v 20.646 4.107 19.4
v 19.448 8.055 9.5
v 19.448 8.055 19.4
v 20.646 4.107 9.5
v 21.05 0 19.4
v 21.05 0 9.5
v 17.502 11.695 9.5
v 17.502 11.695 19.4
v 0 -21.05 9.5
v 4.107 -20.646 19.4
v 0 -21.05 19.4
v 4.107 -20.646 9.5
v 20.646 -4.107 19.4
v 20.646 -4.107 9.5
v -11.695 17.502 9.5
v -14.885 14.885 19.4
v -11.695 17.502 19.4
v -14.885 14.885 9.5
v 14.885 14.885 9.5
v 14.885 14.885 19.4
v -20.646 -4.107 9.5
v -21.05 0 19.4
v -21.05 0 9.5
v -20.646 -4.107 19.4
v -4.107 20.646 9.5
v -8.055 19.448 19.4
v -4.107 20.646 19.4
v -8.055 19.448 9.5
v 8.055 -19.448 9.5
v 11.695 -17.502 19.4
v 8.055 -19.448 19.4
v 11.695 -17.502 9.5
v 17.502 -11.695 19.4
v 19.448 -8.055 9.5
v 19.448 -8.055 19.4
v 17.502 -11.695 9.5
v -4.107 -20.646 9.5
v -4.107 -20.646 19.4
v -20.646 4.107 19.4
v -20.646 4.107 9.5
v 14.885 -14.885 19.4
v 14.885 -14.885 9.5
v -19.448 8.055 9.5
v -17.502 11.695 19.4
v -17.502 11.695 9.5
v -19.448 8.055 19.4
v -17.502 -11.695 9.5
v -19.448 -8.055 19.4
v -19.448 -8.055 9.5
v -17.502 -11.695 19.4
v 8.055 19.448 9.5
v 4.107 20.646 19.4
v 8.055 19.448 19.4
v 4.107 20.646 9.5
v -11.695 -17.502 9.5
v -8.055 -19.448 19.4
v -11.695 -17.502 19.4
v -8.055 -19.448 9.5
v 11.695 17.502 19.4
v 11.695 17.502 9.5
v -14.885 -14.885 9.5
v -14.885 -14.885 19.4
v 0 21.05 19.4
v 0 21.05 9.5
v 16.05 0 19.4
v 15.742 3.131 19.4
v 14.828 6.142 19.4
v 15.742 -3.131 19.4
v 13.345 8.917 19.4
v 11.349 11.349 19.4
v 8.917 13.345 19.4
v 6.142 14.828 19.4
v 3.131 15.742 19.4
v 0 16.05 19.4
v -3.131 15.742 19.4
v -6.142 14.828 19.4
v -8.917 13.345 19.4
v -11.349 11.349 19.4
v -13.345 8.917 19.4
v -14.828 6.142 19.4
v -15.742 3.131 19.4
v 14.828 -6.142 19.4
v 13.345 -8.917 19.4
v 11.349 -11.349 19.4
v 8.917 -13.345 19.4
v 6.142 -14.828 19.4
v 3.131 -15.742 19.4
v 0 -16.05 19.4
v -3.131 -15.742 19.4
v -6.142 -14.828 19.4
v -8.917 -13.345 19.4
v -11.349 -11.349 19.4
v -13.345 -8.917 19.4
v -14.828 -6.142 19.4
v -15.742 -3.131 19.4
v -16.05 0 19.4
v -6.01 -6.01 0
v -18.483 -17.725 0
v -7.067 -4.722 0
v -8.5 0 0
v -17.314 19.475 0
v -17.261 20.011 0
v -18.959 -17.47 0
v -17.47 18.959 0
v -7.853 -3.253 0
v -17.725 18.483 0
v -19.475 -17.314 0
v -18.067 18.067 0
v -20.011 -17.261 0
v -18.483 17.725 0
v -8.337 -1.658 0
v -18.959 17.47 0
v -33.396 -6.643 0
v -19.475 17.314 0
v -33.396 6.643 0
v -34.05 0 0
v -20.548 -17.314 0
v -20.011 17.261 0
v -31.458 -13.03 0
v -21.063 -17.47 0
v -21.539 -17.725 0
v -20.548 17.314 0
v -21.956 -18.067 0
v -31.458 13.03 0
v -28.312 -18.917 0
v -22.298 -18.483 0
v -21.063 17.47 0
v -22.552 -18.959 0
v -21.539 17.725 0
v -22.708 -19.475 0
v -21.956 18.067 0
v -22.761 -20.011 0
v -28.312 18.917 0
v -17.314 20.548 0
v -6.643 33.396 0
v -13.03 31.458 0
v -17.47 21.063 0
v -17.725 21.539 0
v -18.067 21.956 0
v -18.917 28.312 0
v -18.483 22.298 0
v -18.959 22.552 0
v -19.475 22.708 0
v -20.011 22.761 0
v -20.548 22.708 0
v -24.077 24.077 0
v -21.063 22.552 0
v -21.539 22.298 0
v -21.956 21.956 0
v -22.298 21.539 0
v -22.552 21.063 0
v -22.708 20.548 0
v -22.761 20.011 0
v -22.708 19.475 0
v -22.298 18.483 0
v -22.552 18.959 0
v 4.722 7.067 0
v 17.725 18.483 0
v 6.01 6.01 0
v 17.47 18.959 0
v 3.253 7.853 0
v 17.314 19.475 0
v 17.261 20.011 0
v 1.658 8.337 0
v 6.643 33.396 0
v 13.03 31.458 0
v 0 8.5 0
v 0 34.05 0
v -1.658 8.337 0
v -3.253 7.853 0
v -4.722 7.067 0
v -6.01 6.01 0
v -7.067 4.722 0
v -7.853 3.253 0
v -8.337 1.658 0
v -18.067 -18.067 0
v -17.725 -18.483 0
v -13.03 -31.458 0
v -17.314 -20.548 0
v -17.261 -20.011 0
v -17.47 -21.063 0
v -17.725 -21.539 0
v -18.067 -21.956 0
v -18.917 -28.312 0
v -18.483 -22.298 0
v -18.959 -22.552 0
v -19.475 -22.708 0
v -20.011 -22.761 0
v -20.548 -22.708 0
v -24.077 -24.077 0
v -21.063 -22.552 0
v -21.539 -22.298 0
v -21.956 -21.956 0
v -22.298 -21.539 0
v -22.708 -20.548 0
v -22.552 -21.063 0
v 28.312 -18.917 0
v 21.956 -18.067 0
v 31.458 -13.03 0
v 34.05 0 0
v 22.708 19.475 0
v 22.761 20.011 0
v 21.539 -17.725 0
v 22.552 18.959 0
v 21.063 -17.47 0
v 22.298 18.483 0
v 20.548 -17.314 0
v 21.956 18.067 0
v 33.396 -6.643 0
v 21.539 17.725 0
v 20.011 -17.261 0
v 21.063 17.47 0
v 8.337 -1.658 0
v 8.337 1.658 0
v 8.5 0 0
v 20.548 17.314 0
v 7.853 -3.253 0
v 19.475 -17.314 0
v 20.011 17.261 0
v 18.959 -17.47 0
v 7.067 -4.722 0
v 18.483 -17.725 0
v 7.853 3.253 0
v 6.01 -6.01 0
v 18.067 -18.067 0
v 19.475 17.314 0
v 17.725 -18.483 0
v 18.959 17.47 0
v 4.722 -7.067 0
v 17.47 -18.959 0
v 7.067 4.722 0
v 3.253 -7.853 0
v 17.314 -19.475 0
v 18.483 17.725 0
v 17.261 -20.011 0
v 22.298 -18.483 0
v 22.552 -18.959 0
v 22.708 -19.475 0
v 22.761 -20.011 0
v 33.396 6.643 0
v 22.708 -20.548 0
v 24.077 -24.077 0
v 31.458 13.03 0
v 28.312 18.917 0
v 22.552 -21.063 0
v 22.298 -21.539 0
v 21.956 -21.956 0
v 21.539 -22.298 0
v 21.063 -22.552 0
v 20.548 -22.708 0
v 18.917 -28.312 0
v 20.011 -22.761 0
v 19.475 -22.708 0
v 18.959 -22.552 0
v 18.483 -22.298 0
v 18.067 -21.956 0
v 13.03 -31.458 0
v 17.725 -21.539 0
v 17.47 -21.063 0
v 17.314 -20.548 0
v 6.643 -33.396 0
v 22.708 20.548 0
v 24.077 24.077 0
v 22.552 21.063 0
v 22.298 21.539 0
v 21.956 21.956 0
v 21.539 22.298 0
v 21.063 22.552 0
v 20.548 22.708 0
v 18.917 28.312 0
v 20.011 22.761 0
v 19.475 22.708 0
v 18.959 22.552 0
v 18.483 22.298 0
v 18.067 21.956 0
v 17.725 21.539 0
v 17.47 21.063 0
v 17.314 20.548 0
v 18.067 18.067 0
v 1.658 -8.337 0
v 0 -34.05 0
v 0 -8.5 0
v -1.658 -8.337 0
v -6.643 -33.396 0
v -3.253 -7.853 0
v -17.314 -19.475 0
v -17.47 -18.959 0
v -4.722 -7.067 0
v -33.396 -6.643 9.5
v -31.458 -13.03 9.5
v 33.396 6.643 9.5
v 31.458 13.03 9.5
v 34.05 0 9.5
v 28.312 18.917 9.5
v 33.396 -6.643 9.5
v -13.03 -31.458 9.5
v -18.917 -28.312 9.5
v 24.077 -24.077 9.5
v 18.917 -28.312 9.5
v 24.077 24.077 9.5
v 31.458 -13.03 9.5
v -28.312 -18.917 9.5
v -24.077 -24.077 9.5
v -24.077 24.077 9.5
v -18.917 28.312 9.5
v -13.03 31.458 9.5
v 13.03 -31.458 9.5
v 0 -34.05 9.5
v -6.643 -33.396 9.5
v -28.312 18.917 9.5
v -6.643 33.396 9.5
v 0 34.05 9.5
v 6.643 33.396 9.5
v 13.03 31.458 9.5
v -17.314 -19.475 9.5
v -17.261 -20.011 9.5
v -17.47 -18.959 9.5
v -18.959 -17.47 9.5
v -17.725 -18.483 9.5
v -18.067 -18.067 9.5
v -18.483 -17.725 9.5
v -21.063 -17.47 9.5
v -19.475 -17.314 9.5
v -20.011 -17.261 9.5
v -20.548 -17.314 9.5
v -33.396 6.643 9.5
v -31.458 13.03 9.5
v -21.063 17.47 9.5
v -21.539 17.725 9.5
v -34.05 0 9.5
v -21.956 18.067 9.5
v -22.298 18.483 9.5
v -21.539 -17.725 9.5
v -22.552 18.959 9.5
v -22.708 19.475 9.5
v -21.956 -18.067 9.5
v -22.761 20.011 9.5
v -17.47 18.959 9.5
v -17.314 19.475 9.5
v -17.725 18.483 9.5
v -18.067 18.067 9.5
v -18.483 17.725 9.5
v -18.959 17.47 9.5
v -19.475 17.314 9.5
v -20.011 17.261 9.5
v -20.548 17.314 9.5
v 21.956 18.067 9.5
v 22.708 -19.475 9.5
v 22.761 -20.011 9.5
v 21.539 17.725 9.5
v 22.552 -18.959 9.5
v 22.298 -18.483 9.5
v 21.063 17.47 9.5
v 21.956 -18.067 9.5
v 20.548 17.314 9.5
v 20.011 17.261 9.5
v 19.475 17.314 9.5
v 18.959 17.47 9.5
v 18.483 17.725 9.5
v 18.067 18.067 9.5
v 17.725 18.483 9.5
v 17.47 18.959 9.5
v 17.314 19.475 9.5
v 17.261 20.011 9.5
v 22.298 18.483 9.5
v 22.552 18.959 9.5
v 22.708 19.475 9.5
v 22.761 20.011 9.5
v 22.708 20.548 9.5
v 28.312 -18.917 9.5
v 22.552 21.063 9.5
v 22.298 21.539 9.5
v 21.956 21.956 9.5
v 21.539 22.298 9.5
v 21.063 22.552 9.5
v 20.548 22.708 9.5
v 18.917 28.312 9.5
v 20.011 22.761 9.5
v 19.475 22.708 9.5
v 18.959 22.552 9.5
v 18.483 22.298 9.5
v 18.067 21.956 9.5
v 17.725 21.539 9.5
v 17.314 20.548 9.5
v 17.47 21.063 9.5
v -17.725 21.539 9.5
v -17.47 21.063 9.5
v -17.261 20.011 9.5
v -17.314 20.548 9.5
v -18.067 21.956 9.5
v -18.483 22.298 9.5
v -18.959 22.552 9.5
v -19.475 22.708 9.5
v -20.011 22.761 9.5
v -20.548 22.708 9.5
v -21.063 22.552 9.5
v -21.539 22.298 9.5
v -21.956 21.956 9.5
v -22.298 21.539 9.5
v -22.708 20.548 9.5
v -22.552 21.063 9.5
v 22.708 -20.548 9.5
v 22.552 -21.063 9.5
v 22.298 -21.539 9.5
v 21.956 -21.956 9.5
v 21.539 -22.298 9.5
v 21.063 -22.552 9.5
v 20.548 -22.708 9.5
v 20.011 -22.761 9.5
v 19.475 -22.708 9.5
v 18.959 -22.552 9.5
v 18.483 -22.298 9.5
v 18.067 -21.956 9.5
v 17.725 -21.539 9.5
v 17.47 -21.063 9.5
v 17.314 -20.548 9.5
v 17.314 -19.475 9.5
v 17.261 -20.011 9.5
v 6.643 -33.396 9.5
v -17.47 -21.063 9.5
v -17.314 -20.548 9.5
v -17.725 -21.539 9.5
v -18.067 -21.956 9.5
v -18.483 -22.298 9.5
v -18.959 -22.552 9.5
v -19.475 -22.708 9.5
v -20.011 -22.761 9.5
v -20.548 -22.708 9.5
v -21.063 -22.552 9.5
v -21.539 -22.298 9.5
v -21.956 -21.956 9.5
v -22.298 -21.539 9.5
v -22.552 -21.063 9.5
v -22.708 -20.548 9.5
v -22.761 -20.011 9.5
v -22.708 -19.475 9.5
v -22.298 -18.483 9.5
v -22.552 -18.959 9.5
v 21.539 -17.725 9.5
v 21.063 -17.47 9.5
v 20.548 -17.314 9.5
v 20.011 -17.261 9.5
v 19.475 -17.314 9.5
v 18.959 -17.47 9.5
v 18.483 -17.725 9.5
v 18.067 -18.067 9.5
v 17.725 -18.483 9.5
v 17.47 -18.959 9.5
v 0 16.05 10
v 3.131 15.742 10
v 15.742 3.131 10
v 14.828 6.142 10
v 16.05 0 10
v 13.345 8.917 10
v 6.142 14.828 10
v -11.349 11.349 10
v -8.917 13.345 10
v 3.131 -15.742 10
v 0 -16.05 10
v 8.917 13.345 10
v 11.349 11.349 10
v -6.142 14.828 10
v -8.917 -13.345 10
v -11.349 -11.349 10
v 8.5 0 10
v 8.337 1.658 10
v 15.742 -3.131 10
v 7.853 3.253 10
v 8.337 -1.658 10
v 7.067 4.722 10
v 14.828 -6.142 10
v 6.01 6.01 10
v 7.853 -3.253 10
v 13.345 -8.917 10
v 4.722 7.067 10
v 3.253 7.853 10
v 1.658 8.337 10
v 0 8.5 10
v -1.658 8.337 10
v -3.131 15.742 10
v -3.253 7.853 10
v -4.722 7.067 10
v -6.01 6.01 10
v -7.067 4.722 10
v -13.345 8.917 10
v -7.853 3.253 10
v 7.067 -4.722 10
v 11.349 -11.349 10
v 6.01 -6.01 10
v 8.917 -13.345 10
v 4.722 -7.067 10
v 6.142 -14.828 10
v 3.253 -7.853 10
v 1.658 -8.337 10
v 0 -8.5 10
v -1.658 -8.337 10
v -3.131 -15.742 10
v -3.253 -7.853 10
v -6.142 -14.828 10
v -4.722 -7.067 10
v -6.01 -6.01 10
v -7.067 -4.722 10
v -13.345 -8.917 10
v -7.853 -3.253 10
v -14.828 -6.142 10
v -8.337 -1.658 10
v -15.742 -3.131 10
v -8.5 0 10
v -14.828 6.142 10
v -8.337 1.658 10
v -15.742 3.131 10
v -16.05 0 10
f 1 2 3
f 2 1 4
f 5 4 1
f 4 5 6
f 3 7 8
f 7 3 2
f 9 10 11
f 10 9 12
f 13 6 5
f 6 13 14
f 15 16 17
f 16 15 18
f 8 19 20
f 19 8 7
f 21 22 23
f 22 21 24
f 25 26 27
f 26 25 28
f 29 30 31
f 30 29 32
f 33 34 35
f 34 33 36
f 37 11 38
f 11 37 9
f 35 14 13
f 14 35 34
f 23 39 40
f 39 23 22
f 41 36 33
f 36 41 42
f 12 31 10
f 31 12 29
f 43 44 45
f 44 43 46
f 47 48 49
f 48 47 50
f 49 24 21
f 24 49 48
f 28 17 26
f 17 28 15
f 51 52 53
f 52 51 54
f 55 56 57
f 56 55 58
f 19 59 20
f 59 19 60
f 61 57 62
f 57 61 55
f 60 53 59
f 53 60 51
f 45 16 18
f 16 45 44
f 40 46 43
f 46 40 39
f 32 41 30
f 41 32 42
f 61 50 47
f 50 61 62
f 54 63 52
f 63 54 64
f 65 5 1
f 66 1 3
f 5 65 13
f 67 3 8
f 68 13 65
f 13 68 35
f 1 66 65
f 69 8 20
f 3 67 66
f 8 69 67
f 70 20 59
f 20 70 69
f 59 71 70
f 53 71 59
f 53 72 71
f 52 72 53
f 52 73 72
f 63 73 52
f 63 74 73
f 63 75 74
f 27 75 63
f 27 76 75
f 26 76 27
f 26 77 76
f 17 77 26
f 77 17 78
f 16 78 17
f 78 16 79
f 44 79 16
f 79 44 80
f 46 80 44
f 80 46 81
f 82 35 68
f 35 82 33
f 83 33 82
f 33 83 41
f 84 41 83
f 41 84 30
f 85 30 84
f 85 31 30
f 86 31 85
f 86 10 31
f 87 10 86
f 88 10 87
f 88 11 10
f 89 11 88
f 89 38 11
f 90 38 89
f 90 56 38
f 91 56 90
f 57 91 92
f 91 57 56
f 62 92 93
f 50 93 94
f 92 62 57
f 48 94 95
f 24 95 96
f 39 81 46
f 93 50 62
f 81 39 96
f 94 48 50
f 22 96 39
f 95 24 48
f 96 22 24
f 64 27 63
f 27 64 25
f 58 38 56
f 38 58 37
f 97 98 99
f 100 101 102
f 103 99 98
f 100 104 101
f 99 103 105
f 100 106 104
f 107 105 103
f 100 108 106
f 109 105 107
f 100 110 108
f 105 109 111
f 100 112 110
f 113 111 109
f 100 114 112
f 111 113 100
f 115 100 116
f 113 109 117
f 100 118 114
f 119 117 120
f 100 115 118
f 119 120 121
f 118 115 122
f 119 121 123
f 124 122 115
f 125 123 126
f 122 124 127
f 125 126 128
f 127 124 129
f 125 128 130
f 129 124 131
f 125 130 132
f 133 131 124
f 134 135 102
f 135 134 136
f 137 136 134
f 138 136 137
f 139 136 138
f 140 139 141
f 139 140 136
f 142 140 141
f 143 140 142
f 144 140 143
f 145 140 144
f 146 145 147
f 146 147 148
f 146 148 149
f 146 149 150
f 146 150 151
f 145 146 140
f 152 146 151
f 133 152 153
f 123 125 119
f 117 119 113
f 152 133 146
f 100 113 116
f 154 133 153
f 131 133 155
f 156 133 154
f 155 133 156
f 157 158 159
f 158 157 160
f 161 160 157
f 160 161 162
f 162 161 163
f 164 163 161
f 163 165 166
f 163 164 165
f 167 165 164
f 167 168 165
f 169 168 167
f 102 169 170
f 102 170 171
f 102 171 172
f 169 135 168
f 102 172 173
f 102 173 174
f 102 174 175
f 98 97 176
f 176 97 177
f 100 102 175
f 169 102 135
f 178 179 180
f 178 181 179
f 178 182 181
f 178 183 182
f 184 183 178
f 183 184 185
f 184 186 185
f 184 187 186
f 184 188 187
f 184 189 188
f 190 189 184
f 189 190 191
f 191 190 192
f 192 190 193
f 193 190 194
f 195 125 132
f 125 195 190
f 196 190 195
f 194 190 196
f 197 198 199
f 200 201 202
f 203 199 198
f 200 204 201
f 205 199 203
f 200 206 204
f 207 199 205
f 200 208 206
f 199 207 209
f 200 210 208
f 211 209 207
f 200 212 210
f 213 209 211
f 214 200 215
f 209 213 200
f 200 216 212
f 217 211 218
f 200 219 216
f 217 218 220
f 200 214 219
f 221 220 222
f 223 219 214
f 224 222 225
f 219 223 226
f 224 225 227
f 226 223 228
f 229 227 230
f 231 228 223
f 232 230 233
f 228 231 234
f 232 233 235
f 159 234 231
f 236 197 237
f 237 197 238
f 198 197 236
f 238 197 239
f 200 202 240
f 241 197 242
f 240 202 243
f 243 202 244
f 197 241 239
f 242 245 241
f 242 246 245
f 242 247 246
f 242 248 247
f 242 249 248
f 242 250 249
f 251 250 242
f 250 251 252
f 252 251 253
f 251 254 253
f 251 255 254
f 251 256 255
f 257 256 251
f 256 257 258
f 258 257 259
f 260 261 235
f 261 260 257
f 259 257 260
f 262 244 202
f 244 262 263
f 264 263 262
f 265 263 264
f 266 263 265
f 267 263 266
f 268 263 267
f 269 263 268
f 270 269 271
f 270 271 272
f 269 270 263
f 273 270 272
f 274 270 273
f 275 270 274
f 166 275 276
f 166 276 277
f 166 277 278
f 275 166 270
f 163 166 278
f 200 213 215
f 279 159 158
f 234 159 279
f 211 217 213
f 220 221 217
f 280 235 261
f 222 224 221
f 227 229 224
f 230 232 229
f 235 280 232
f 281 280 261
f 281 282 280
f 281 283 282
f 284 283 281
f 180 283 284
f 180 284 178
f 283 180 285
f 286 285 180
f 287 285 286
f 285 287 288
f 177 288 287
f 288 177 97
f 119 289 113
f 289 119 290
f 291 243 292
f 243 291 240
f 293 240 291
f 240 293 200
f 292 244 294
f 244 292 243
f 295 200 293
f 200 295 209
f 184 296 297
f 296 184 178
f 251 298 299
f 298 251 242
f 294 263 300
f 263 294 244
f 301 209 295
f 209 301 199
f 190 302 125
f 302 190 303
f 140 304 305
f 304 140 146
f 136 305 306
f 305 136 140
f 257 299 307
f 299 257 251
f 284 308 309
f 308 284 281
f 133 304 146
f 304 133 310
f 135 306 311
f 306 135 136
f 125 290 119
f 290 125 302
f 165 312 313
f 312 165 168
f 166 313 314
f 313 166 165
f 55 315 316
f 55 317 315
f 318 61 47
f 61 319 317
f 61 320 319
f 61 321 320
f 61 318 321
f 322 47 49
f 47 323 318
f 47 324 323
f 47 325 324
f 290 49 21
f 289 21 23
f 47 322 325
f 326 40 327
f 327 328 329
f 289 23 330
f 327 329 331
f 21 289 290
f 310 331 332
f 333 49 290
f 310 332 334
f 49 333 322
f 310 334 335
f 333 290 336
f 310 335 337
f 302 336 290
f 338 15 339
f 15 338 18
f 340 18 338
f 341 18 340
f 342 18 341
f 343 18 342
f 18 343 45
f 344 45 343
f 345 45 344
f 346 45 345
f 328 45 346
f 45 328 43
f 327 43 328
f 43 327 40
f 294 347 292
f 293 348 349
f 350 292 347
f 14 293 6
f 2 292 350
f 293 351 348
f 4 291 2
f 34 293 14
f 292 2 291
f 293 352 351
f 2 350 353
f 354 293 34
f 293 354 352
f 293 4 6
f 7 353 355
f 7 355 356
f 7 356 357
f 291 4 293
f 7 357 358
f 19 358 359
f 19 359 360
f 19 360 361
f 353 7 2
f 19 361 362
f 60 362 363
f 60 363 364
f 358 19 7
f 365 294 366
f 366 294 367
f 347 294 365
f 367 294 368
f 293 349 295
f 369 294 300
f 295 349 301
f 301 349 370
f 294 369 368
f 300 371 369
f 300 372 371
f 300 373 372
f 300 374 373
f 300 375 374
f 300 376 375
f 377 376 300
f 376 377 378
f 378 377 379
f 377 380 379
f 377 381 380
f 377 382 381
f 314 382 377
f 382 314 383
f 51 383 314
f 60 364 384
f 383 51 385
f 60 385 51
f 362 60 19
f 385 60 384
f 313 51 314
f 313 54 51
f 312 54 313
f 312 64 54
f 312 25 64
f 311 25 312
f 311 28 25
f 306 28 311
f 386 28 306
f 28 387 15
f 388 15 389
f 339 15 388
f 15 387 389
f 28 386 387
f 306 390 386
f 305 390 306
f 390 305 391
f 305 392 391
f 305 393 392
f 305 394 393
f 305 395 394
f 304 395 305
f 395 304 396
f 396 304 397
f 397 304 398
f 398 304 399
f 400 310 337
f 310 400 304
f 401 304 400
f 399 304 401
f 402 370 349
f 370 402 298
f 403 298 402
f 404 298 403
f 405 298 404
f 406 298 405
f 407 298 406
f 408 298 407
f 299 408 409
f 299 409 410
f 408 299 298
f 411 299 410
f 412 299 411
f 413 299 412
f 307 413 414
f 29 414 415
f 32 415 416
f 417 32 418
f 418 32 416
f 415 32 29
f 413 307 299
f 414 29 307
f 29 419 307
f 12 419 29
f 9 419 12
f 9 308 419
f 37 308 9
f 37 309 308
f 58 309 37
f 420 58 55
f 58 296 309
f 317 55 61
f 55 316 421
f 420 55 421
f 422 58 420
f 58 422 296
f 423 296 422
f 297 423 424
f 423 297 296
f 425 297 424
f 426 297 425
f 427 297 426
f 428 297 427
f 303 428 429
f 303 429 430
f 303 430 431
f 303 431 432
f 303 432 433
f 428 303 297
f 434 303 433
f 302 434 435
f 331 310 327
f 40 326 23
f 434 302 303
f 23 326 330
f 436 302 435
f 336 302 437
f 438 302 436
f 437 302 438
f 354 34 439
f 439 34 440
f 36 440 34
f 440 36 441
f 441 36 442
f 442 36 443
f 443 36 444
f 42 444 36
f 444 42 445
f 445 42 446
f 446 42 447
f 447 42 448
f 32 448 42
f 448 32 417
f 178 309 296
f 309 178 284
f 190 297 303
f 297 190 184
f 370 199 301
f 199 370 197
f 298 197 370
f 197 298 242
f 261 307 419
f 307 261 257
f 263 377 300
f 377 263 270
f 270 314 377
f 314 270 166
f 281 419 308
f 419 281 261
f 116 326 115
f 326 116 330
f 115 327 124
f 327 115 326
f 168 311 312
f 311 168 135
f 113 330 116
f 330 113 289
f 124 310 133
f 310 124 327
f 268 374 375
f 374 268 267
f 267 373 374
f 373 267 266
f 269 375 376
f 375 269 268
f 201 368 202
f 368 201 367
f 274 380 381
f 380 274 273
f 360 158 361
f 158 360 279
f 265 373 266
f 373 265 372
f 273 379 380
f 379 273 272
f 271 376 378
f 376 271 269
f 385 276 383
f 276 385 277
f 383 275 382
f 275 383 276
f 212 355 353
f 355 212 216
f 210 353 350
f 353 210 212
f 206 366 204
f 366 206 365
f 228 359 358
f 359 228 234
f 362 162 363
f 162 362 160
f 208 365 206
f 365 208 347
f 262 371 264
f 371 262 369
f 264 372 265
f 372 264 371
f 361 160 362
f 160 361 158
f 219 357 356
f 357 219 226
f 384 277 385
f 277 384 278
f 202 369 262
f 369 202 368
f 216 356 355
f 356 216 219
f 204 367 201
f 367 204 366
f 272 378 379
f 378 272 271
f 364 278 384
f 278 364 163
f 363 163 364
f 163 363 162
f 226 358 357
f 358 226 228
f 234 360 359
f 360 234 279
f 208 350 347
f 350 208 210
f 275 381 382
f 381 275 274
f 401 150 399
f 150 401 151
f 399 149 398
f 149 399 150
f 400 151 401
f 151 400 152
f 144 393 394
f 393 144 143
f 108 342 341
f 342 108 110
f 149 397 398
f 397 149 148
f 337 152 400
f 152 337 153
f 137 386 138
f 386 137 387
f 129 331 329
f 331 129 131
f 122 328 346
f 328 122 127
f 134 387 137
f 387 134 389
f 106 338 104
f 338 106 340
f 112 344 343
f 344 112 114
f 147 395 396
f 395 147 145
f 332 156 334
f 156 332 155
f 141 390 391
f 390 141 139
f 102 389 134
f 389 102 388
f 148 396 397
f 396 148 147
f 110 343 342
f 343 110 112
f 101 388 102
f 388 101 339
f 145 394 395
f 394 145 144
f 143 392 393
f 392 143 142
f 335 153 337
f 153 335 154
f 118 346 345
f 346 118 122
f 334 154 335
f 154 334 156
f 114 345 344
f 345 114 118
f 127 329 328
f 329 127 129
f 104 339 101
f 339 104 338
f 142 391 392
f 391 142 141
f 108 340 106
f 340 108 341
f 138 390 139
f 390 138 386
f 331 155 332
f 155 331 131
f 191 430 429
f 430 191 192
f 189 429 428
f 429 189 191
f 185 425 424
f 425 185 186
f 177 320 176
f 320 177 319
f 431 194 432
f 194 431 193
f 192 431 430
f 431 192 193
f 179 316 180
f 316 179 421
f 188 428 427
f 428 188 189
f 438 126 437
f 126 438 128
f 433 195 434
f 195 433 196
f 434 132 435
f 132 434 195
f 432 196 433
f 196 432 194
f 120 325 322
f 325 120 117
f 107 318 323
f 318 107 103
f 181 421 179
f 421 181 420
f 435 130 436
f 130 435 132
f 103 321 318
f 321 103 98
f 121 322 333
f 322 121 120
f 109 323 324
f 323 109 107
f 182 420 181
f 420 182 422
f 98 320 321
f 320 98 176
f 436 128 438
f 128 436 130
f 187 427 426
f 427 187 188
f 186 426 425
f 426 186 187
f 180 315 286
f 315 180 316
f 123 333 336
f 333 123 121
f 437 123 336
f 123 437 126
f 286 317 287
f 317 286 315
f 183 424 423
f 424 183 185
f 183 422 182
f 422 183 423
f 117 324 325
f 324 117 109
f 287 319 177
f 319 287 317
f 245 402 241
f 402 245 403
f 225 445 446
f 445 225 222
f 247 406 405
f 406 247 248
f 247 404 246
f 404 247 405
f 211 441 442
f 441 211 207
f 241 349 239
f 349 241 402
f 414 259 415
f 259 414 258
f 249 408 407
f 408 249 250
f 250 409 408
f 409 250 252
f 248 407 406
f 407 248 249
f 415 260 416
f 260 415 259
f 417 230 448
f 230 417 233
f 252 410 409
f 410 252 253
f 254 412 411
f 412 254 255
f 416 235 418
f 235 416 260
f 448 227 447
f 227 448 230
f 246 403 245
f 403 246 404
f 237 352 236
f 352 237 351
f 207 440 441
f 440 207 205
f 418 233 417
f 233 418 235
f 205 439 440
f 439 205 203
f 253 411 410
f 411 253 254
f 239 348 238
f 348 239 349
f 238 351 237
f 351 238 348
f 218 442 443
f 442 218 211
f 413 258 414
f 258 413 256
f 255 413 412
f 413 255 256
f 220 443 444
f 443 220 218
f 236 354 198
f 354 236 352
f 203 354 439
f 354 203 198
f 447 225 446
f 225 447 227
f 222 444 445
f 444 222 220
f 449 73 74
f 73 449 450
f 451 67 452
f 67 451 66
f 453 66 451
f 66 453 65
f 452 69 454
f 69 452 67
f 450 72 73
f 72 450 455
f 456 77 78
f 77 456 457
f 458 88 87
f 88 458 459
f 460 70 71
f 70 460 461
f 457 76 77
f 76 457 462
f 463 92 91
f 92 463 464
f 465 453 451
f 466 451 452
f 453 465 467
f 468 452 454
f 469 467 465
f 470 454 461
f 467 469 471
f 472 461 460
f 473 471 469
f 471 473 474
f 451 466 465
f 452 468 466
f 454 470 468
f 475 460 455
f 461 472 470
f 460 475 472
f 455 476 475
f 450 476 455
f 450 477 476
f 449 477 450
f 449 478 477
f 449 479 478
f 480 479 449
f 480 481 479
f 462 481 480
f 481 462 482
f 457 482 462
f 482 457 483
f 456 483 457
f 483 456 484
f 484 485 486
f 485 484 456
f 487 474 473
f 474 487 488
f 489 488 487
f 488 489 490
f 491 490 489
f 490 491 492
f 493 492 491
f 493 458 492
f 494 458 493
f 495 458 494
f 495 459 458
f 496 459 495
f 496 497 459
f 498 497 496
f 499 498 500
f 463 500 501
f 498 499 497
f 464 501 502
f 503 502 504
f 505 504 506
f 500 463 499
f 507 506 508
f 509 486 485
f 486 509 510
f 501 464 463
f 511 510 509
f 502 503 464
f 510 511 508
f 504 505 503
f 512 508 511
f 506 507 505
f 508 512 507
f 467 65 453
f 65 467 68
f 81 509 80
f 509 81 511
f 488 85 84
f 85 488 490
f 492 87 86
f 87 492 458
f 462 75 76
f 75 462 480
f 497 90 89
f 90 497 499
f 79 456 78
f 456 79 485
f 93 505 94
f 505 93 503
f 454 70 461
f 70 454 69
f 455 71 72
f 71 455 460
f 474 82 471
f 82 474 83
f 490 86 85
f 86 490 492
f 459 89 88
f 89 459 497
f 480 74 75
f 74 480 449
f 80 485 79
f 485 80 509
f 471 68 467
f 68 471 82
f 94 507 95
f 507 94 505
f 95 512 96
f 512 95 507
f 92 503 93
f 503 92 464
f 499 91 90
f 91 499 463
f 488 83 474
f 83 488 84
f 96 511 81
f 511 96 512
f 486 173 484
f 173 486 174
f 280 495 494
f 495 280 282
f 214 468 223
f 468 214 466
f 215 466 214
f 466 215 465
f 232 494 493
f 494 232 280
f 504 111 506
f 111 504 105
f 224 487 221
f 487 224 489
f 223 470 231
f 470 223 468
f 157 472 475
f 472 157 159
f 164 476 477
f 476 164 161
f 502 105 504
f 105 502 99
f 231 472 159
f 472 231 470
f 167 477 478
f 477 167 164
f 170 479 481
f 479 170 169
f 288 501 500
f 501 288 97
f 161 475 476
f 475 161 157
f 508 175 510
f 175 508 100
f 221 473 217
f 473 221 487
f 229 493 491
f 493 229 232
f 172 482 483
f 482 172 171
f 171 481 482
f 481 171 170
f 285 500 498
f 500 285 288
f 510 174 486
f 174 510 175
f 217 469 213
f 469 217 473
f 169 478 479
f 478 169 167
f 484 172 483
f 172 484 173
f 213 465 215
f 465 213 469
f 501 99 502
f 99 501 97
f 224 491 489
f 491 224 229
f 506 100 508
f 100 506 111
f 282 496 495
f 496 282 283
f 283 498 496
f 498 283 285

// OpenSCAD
$fn = 32;

// ----------------------------------------------------------------------
// Bearing housing: seat for 6002 (32 x 9 mm), 42.1 mm body
// ----------------------------------------------------------------------

// --- parameters (mm) ---
case_d = 42.1;            // housing outside diameter
case_h = 19.4;            // overall housing height
rim_t = 5;                // wall thickness
bearing_seat = 32.1;      // 6002 seat, 0.1 mm clearance
seat_h = 9.4;             // pocket depth
shoulder = 2;             // shoulder under the bearing
pass_d = 17;              // shaft passage
ear_d = 68.1;             // mounting flange diameter
flange_t = 8;             // flange thickness
bolt_d = 5.5;             // flange bolt clearance
bolt_r = 28.3;            // flange bolt circle radius

module body() {
  cylinder(h = case_h, d = case_d);
}

module flange() {
  /* flange sunk 1.5 mm into the body */
  cylinder(h = flange_t + 1.5, d = ear_d);
}

difference() {
  union() {
    body();
    flange();
  }
  translate([0, 0, case_h - seat_h]) cylinder(h = seat_h + 1, d = bearing_seat);
  translate([0, 0, -1]) cylinder(h = case_h - seat_h + 1, d = pass_d);
  for (i = [0 : 3]) rotate([0, 0, 45 + i * 90]) translate([bolt_r, 0, -1])
    cylinder(h = flange_t + 3, d = bolt_d);
}
